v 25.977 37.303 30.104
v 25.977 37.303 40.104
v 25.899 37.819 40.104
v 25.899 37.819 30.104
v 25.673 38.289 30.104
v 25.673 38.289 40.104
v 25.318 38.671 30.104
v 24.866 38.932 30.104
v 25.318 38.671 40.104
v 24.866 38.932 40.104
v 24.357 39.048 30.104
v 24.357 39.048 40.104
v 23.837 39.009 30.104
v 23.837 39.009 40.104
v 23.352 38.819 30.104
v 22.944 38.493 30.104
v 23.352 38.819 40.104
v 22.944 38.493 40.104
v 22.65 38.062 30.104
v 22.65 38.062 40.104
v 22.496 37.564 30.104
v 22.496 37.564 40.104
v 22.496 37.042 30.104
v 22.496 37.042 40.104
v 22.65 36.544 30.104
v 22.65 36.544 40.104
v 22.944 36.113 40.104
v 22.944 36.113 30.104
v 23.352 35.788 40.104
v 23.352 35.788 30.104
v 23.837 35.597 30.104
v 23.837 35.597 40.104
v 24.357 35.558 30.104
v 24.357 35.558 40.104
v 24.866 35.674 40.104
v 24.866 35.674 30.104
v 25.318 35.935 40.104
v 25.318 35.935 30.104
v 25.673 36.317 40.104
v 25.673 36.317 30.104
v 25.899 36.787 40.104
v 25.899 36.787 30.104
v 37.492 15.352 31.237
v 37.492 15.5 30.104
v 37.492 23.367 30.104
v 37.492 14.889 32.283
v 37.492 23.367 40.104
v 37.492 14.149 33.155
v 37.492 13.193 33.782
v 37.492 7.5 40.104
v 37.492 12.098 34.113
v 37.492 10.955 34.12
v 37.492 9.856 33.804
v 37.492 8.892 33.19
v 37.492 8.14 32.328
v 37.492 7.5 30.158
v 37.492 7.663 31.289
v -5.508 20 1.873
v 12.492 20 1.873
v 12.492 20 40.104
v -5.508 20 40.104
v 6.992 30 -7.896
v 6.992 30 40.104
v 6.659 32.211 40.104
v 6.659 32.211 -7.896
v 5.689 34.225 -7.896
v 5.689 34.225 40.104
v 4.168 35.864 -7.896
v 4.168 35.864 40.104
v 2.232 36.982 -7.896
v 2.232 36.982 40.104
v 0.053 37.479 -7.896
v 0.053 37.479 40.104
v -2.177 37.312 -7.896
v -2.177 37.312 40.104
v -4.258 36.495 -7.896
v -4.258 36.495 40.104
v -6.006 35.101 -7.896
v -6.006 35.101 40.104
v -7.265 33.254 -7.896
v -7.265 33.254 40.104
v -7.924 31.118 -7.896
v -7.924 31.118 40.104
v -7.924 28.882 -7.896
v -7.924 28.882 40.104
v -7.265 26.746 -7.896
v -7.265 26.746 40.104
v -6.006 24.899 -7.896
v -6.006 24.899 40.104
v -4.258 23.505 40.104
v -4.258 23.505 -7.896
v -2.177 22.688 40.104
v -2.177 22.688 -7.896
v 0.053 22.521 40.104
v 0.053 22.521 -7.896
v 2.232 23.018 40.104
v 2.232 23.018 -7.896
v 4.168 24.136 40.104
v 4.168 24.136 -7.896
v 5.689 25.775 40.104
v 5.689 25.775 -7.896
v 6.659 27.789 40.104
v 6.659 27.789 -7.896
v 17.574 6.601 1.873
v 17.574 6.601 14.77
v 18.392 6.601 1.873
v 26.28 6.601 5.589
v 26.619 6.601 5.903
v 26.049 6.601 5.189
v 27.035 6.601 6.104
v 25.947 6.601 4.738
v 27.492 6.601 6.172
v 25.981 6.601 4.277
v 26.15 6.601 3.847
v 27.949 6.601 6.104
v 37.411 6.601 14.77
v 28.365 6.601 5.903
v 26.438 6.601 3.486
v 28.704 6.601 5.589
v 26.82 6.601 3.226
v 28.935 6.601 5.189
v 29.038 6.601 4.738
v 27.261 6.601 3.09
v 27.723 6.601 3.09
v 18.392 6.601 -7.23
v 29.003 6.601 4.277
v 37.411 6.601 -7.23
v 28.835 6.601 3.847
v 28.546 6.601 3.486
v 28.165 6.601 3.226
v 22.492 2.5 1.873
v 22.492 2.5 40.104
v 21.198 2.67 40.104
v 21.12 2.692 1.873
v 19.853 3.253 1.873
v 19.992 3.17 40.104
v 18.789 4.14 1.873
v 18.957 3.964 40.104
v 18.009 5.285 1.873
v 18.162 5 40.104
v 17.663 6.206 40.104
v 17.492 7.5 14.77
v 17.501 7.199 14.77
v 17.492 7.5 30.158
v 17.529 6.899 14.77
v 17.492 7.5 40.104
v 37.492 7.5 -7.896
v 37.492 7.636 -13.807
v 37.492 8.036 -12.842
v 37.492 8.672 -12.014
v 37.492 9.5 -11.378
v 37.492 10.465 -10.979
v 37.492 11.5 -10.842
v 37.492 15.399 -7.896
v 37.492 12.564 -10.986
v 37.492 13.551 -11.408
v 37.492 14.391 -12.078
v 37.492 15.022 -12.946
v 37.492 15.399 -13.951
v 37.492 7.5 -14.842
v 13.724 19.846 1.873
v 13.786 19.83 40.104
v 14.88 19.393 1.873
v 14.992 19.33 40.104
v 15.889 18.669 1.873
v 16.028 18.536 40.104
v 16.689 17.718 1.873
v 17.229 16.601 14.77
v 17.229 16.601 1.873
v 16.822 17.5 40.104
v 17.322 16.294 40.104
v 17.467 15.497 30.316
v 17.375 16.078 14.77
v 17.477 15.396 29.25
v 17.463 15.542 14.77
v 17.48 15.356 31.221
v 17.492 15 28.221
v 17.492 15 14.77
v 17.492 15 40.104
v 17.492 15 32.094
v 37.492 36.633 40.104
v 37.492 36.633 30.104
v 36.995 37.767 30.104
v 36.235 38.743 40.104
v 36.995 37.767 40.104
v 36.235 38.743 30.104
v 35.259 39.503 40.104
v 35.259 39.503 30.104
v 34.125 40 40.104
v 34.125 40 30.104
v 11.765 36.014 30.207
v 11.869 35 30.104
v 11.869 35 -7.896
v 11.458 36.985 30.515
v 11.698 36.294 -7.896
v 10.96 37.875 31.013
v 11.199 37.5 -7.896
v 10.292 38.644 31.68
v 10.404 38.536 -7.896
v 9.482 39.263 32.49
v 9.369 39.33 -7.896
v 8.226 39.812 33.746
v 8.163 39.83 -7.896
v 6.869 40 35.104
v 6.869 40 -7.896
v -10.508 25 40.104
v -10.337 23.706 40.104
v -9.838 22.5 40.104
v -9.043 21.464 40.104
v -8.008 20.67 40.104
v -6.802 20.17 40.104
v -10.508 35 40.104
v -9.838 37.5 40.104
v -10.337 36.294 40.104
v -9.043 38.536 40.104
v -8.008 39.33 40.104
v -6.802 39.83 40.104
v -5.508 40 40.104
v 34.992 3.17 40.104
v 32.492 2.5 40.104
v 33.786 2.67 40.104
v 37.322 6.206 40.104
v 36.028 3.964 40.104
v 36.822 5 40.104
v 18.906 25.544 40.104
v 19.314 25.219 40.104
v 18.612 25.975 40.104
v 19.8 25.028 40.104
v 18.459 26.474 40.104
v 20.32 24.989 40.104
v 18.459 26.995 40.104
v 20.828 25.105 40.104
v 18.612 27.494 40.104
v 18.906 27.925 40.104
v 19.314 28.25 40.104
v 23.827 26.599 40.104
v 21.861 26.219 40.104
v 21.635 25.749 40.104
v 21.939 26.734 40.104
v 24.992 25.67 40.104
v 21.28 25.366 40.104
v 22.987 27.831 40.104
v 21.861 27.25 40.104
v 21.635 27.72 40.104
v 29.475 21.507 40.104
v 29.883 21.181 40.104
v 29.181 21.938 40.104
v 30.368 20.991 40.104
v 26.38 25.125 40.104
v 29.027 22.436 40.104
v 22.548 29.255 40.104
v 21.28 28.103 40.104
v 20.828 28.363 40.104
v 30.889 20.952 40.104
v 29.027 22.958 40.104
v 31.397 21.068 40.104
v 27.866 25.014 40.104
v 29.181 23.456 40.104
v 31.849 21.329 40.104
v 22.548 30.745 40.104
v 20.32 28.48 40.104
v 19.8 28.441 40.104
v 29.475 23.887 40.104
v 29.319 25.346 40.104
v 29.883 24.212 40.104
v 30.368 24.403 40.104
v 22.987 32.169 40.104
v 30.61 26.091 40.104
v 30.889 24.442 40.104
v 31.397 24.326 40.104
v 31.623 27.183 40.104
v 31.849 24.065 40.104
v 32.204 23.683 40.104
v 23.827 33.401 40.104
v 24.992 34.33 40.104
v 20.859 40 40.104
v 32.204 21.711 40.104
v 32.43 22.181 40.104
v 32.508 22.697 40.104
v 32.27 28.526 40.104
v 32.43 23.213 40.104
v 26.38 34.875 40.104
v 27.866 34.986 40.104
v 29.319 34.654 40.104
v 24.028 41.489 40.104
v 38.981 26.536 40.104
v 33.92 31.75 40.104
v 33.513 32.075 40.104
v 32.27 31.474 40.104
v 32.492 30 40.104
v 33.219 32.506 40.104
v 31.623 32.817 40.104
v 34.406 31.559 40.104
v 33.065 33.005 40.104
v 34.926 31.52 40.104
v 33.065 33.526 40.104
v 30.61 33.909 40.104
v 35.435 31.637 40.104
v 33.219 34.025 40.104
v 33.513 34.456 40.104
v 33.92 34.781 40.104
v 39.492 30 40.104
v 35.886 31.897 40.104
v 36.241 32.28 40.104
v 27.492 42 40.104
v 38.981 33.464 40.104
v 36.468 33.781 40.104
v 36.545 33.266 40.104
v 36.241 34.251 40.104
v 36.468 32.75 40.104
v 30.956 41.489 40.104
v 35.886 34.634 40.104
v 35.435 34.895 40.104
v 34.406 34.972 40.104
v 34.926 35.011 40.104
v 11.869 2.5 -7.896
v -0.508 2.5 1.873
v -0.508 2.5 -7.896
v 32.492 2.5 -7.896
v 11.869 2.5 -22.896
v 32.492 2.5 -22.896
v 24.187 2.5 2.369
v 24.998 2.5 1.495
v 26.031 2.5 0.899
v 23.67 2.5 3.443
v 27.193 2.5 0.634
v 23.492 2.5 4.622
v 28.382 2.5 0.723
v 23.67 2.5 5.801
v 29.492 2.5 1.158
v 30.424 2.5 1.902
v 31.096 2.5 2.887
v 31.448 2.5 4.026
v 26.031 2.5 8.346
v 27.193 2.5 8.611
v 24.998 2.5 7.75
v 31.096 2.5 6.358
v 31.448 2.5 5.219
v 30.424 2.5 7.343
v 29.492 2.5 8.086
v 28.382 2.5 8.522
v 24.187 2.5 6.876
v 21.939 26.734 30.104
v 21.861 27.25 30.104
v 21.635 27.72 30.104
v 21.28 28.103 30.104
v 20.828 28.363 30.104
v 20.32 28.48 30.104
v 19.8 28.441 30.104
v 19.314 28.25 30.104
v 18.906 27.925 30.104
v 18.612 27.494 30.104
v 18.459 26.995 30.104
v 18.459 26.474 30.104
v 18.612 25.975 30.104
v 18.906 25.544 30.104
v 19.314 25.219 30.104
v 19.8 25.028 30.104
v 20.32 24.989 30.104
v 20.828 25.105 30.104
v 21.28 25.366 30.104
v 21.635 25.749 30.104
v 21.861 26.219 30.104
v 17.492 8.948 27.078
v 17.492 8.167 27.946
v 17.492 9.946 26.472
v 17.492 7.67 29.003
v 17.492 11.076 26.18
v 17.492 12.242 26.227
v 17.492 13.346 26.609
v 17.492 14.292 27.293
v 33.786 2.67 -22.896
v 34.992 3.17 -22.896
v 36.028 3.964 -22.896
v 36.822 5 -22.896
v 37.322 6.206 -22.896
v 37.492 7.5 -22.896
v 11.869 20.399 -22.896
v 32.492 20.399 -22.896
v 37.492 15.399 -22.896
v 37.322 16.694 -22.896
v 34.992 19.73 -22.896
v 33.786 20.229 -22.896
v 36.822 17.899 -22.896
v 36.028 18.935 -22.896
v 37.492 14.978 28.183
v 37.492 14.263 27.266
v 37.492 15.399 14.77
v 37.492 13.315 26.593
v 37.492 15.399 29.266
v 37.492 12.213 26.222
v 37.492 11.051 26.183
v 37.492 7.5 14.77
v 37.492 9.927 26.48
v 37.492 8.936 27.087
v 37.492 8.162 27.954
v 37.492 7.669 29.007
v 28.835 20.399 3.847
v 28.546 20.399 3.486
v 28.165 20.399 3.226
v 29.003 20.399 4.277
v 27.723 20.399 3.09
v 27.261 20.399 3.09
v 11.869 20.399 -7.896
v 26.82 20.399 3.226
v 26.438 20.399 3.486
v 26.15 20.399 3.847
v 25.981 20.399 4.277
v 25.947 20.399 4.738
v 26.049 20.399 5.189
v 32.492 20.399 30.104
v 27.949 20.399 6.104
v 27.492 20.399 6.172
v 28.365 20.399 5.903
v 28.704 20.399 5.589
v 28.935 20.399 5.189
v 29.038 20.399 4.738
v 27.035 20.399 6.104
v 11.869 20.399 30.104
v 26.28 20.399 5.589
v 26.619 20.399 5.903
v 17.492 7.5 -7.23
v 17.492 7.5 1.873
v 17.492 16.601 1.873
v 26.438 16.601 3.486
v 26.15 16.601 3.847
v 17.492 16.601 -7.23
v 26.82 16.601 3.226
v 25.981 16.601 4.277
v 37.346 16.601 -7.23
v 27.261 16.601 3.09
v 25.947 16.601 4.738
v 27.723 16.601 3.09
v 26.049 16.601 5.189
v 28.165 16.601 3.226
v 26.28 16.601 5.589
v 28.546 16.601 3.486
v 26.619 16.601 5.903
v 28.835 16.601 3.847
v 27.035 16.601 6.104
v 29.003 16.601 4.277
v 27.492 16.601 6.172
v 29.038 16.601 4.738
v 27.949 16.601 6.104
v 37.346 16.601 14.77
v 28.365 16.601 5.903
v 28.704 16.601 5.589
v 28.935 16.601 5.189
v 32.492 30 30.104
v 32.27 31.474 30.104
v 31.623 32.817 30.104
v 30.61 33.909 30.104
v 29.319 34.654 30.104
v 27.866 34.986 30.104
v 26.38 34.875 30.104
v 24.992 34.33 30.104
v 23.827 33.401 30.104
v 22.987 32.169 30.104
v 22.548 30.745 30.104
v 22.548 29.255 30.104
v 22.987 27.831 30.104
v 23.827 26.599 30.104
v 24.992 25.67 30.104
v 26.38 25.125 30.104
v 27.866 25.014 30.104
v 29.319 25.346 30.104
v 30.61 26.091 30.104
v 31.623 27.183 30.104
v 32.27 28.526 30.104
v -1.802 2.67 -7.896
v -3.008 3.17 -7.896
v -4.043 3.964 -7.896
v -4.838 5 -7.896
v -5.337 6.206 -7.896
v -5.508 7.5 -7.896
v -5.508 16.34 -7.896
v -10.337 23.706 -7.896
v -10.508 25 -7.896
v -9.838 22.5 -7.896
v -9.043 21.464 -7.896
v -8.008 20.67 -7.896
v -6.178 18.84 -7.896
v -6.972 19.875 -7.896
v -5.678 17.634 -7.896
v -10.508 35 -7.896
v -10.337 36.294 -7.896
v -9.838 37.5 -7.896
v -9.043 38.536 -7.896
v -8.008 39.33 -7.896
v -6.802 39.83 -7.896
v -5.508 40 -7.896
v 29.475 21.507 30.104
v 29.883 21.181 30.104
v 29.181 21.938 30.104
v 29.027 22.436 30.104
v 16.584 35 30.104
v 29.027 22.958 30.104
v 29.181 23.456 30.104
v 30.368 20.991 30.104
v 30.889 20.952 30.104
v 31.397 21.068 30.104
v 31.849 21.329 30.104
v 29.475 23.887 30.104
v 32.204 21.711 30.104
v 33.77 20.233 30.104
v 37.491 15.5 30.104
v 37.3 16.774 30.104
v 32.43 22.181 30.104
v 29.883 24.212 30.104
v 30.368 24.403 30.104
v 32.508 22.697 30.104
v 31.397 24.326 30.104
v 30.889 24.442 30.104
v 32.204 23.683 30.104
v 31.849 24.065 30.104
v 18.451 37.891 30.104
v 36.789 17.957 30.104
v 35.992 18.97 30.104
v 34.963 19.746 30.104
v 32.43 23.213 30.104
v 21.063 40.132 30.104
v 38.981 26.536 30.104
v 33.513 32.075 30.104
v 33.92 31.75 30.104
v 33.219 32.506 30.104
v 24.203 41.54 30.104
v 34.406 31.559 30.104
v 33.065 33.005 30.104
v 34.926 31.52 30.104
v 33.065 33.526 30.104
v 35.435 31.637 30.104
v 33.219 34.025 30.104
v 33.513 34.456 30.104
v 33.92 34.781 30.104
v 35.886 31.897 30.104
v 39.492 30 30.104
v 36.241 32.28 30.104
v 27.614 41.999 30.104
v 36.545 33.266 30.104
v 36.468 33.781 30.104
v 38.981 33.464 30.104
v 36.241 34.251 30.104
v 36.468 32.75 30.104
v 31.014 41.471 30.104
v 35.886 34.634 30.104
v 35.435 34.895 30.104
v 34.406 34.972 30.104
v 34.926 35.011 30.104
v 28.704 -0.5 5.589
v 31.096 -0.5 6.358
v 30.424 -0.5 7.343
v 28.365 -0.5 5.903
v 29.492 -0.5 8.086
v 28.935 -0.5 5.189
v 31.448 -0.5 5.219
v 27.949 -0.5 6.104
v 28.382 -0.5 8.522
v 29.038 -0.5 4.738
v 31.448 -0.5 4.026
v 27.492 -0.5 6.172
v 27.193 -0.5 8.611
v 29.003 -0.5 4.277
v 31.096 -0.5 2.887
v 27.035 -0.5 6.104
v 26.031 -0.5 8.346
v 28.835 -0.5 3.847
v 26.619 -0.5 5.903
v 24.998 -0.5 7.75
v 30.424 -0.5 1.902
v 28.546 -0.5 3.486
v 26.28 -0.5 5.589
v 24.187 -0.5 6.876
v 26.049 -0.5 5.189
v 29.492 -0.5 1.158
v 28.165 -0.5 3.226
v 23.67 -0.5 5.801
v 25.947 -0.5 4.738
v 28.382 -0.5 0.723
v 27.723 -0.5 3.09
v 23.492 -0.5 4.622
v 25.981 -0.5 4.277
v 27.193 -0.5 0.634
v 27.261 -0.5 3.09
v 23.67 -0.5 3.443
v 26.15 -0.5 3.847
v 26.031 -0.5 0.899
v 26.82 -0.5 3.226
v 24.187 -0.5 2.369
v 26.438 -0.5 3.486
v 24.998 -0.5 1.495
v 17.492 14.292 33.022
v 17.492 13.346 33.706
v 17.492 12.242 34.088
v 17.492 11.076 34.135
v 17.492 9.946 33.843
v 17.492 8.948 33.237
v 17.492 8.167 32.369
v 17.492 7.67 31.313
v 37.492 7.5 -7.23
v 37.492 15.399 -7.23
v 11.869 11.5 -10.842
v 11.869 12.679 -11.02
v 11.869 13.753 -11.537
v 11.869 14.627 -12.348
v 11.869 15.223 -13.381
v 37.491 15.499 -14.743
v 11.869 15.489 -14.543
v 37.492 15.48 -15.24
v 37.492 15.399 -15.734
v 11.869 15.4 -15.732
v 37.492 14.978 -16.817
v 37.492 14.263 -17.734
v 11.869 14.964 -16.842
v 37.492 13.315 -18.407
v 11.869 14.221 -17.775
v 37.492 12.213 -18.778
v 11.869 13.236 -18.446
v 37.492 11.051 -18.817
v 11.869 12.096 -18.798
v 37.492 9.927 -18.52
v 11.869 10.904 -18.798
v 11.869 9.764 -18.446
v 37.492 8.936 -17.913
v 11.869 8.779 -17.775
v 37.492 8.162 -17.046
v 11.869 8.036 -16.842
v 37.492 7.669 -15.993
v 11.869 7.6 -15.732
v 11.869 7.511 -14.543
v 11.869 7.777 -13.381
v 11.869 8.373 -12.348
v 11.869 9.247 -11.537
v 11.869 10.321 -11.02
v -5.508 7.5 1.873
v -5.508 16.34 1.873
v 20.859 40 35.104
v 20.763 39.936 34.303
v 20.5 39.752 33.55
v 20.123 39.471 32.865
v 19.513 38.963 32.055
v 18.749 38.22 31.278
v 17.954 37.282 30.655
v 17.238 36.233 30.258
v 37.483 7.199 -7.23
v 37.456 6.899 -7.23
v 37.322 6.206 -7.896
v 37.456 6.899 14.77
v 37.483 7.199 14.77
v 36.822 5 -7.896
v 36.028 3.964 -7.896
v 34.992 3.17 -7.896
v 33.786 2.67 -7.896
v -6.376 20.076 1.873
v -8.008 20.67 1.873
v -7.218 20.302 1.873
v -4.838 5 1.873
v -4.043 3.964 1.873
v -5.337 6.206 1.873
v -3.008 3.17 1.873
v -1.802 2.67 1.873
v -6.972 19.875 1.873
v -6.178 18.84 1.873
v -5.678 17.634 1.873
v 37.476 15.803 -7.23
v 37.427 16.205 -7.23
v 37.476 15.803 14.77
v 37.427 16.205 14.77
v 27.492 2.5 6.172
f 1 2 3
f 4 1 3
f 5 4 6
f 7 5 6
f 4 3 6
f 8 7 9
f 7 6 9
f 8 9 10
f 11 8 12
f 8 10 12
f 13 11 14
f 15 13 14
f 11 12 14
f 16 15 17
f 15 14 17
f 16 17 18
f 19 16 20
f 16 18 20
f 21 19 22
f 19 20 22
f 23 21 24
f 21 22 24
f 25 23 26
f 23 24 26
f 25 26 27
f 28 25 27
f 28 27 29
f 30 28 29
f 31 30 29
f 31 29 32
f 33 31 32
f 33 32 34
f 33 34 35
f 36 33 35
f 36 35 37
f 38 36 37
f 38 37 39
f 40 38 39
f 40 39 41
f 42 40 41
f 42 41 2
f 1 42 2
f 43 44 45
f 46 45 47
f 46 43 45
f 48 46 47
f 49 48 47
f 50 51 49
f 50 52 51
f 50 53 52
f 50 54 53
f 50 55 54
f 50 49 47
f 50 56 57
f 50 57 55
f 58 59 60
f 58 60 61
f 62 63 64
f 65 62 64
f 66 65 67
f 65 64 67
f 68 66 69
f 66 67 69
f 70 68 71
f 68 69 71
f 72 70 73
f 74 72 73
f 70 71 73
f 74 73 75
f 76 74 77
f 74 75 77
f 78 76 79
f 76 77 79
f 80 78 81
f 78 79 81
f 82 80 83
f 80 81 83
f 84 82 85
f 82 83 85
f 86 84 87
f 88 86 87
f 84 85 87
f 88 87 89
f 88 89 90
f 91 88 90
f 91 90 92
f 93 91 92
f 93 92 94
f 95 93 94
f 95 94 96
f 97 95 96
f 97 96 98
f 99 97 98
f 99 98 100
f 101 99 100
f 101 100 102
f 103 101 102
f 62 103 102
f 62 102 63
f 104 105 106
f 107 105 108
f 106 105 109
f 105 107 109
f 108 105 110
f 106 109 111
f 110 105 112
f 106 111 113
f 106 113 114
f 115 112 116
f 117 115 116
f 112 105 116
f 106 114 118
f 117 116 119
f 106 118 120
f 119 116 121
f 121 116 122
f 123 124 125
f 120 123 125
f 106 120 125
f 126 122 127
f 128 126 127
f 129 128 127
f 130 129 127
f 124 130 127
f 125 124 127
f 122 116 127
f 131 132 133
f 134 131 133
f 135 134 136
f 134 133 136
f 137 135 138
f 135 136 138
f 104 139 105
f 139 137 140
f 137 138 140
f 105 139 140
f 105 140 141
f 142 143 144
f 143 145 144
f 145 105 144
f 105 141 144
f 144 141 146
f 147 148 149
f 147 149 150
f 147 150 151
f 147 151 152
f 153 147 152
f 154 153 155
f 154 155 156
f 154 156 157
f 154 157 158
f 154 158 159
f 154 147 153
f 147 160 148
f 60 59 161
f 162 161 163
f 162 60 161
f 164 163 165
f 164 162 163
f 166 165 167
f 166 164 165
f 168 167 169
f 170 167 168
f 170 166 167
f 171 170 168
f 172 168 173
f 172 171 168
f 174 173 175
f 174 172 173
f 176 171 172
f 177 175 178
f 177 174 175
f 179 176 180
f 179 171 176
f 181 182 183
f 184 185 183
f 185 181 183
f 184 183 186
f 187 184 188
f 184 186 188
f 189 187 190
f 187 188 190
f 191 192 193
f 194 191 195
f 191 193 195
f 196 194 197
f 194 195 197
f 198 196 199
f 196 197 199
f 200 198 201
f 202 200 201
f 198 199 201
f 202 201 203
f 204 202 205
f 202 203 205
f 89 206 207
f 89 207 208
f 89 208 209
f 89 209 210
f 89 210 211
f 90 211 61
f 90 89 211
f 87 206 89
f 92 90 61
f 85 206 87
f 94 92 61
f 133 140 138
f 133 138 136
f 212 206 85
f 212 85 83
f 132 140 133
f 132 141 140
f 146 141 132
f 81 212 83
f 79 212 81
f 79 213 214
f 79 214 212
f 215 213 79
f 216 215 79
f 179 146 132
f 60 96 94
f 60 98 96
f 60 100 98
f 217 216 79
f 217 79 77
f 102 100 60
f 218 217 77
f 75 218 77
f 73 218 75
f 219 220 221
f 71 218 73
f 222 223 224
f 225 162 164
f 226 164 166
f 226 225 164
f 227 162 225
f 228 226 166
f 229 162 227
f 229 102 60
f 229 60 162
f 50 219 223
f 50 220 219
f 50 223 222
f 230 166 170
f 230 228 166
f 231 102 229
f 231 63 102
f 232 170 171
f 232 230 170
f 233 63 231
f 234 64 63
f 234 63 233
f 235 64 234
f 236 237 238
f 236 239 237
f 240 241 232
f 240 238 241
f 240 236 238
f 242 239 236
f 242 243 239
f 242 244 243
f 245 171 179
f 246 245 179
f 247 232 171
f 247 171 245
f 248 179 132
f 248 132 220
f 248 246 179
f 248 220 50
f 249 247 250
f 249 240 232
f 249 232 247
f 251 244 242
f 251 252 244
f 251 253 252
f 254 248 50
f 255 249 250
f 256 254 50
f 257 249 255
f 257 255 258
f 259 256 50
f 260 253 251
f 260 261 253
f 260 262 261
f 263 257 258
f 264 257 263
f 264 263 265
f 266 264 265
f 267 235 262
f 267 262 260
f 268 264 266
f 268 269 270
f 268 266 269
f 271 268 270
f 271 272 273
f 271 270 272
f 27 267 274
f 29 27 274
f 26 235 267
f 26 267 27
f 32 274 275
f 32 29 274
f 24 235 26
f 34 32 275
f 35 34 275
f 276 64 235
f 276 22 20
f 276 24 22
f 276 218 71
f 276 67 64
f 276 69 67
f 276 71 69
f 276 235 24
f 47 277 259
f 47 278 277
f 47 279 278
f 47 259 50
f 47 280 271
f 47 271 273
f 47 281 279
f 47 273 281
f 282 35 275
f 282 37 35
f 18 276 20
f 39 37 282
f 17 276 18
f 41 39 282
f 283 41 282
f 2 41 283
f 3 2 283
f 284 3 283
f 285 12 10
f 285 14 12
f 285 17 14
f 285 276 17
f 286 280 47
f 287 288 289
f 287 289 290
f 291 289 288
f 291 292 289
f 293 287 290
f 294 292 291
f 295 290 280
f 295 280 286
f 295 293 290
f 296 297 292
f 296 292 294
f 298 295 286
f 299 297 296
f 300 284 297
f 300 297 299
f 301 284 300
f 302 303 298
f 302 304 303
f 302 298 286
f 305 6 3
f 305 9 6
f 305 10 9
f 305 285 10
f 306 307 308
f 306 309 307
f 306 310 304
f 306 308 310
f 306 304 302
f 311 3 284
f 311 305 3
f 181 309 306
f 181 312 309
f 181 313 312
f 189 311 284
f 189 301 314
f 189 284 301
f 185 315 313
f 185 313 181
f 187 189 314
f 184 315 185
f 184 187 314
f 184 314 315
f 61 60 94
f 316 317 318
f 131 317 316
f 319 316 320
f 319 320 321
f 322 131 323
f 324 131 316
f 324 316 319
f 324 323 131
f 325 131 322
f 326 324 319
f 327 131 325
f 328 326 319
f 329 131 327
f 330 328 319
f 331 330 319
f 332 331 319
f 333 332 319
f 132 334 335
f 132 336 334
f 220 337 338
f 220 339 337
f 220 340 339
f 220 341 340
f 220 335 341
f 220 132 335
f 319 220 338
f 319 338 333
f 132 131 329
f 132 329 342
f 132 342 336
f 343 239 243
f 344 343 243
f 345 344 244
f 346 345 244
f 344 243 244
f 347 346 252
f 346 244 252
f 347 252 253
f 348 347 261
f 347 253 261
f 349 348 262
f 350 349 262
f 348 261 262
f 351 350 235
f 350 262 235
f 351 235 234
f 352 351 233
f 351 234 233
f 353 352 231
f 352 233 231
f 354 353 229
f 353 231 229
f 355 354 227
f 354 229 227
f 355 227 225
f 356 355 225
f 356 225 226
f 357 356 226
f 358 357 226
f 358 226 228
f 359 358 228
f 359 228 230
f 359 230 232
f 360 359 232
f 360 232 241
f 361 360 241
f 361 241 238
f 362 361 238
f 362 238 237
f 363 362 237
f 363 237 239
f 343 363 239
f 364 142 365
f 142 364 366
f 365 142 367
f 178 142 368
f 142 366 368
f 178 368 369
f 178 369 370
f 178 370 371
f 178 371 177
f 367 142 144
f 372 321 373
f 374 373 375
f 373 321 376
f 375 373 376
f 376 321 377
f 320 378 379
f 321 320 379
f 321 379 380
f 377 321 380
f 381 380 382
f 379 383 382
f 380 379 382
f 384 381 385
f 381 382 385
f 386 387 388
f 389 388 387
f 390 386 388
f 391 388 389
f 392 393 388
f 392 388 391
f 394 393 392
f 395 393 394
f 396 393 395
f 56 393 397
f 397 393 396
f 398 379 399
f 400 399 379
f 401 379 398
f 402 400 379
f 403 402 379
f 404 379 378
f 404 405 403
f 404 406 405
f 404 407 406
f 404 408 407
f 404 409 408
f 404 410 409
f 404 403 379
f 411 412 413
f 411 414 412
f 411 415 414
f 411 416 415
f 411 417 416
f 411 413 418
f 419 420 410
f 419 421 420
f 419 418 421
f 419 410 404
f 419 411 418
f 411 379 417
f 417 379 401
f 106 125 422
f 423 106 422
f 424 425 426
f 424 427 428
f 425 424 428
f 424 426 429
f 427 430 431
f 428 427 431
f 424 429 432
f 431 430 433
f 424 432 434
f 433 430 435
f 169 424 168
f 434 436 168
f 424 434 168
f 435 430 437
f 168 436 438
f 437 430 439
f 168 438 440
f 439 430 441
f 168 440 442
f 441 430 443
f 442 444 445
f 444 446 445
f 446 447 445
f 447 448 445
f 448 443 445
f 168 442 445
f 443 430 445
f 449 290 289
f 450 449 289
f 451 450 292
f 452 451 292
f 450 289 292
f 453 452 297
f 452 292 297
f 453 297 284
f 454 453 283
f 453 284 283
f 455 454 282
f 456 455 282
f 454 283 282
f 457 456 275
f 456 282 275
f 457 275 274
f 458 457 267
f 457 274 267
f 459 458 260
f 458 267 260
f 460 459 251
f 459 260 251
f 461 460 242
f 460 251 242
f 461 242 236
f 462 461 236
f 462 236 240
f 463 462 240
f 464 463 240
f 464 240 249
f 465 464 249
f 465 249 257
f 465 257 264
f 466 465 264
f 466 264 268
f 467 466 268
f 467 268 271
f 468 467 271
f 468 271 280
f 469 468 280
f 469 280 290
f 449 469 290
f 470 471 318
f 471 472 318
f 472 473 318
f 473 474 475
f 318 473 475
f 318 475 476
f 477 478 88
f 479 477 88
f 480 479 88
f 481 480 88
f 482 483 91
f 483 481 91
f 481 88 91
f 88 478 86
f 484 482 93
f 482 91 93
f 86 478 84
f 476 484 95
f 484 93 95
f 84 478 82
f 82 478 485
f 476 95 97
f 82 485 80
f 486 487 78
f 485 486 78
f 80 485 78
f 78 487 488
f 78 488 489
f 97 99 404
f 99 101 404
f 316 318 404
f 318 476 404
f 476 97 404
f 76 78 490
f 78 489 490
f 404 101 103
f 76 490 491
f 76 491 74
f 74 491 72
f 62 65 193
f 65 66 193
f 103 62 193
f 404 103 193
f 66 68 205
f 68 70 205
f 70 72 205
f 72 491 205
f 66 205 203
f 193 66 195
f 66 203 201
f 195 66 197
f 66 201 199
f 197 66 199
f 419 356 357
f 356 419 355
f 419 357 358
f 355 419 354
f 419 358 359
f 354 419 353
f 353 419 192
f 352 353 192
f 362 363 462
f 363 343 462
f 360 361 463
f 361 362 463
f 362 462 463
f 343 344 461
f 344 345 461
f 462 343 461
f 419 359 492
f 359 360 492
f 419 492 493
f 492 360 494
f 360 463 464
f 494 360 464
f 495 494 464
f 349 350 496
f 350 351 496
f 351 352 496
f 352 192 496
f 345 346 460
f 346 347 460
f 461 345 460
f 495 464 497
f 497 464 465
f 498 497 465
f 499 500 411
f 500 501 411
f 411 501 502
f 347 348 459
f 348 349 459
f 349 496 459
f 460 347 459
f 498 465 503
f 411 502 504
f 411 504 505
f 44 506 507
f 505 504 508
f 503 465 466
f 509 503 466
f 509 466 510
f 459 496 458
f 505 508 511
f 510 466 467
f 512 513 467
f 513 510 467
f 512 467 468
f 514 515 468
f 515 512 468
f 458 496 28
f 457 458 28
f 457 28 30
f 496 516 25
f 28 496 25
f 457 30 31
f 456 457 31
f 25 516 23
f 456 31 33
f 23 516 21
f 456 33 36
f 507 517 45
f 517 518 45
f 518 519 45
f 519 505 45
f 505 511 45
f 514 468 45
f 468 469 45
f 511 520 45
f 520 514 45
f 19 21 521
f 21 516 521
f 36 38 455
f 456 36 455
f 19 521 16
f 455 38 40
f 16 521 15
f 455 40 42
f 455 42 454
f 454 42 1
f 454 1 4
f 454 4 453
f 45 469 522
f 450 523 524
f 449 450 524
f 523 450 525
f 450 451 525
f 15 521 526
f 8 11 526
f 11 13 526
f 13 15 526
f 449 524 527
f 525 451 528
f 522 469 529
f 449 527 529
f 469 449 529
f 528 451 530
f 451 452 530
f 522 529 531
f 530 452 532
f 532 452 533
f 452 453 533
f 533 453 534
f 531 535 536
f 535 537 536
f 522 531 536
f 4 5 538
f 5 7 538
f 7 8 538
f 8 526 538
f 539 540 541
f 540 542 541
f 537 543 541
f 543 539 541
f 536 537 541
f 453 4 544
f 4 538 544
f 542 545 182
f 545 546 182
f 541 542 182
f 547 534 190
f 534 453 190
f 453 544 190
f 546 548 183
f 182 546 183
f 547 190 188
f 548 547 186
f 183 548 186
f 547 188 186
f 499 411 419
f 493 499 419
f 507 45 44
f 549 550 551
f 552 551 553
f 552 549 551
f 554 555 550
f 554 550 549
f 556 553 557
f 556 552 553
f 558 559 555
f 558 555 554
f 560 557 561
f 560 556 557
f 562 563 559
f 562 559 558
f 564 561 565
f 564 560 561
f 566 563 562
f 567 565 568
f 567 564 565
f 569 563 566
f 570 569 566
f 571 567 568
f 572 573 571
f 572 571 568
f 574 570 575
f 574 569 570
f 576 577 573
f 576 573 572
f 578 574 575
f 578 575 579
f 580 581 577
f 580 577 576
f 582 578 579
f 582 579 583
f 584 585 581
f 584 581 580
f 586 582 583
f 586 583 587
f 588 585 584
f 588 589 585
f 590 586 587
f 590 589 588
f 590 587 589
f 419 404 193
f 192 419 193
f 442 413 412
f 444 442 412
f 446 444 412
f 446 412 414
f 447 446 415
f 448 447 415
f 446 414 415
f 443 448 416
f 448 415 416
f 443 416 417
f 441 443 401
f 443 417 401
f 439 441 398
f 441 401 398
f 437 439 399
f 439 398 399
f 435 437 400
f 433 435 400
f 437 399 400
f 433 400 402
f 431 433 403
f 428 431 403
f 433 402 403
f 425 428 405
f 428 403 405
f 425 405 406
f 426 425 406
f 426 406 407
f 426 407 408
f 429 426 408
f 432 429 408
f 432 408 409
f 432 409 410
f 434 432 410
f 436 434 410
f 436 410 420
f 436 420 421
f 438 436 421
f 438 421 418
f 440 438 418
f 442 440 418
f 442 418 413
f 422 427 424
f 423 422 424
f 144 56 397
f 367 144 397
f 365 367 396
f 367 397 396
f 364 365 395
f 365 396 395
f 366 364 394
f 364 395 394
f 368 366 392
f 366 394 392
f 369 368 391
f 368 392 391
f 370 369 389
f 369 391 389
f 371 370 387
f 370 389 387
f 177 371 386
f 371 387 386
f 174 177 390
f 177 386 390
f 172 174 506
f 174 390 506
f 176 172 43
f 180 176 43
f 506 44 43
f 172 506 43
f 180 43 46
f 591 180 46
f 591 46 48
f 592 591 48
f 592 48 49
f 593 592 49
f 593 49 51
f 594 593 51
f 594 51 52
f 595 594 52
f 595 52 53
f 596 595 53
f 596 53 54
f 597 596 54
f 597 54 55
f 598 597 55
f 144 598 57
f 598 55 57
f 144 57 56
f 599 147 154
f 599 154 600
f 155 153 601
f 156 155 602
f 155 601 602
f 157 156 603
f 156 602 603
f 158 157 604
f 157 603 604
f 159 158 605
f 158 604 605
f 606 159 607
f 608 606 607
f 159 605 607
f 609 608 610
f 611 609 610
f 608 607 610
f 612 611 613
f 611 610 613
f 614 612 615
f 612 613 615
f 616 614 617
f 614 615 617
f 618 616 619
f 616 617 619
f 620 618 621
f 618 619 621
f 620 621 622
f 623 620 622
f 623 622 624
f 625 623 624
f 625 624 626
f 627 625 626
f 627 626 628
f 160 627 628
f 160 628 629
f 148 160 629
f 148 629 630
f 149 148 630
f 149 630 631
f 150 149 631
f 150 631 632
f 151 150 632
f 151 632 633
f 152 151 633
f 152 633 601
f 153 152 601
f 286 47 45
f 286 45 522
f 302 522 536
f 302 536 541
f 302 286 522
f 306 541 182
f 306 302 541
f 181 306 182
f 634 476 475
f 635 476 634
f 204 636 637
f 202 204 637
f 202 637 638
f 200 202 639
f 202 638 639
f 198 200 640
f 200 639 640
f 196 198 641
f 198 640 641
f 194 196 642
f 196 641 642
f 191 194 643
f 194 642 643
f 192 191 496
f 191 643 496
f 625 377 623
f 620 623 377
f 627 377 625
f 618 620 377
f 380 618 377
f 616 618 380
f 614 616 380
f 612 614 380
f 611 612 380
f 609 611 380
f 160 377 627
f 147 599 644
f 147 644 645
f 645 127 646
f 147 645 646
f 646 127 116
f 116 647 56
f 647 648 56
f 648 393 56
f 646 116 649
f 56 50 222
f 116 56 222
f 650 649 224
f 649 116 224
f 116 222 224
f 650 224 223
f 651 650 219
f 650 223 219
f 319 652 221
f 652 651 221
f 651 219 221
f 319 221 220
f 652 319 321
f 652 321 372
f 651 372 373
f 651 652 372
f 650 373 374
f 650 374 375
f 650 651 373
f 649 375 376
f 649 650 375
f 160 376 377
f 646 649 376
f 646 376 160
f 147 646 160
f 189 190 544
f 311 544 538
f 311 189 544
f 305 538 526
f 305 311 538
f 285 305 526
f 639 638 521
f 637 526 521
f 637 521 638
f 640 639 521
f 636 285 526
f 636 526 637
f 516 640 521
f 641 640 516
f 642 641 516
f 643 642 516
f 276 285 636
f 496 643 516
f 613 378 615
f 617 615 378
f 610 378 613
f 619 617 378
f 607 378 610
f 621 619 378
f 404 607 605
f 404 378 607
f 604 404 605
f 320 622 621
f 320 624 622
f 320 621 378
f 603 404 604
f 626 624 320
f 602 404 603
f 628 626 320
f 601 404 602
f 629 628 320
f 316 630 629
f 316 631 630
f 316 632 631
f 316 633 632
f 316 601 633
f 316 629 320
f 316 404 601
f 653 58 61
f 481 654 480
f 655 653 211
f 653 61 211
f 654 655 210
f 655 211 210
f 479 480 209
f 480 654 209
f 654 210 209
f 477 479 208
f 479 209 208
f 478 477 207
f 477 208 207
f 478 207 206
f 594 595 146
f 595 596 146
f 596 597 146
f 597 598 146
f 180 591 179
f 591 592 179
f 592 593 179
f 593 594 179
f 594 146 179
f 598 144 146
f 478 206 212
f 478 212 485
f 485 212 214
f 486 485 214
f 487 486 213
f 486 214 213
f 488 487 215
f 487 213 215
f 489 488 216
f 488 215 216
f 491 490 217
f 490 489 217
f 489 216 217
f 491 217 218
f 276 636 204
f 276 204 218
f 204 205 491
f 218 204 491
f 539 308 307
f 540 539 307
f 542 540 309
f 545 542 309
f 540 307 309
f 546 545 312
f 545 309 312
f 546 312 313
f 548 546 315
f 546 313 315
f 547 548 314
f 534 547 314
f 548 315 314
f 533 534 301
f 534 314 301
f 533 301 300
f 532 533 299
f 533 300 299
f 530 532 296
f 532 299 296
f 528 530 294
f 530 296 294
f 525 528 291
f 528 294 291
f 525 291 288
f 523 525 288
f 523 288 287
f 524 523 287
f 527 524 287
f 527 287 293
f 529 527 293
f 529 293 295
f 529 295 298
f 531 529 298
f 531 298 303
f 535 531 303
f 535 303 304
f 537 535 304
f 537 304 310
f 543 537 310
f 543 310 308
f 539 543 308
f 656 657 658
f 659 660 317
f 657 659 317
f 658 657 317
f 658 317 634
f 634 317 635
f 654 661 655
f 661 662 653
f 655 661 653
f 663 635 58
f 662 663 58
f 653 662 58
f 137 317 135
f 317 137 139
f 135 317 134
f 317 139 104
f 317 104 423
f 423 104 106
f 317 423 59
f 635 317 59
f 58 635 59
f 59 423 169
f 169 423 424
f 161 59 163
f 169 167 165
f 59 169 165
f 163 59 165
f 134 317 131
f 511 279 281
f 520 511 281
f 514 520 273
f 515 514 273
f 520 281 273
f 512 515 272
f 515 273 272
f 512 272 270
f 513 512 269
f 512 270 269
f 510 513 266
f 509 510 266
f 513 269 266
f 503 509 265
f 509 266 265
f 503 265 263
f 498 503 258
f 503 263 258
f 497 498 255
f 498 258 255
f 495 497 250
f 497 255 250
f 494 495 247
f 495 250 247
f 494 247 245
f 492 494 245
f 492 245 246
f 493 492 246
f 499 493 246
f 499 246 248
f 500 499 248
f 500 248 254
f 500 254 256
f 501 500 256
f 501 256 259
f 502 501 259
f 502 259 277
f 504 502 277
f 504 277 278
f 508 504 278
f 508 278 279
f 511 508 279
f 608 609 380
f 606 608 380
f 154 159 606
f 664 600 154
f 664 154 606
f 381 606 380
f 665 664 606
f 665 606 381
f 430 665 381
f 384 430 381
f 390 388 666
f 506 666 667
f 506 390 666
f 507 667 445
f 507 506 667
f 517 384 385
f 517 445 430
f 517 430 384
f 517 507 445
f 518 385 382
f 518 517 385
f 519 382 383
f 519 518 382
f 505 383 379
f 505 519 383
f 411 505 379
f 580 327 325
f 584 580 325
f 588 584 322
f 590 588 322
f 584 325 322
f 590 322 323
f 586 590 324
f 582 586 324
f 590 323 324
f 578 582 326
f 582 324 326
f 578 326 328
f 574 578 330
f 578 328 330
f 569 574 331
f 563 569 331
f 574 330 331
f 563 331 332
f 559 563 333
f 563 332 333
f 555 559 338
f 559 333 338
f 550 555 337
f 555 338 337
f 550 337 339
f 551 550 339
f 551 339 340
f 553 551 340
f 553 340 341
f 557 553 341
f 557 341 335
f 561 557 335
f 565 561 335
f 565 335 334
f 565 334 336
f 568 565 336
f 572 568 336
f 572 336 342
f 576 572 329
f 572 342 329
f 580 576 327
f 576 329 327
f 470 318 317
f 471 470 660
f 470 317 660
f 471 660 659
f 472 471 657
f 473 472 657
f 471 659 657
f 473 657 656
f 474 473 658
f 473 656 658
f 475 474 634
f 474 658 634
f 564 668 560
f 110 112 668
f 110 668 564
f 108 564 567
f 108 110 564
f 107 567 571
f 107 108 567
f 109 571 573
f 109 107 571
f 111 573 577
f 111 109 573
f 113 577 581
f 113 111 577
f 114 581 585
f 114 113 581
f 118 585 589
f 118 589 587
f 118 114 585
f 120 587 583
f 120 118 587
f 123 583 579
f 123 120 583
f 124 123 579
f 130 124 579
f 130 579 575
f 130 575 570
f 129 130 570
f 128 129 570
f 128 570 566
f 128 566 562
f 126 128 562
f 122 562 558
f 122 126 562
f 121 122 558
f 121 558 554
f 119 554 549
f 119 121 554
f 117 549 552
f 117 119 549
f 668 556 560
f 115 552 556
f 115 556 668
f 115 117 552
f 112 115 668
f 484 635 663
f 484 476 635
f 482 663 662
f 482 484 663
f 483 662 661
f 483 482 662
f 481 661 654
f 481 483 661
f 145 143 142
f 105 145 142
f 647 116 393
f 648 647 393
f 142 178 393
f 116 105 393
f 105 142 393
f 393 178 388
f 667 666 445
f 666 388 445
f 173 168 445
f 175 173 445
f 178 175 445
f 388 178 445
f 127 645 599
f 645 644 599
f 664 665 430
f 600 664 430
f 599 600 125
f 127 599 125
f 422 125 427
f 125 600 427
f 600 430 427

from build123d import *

# Parameters (mm, degrees)
EXTRUDE_1_DEPTH      = 40
SKETCH_2_R           = 7.5
SKETCH_2_R_2         = 4.9999999999999964
SKETCH_2_R_3         = 1.7500000000003626
SKETCH_2_R_4         = 1.7500000000004823
SKETCH_2_R_5         = 1.7500000000000004
SKETCH_2_R_6         = 1.7500000000001783
CUT_EXTRUDE_1_DEPTH  = 73.86746296427441
SKETCH_3_R           = 12.000000000543196
SKETCH_3_R_2         = 5.500000000543195
SKETCH_3_R_3         = 1.750000000000366
SKETCH_3_R_4         = 1.7500000000000004
SKETCH_3_R_5         = 1.7500000000001772
SKETCH_3_R_6         = 1.7500000000004823
EXTRUDE_3_DEPTH      = 10
SKETCH_4_W           = 25.62343390414386
SKETCH_4_H           = 19.600582626289906
CUT_EXTRUDE_2_DEPTH  = 38.00000000000001
FILLET_1_R           = 5
SKETCH_5_W           = 22
SKETCH_5_H           = 10
CUT_EXTRUDE_3_DEPTH  = 76.3412297087783
CUT_EXTRUDE_4_DEPTH  = 76.01757174727166
FILLET_2_R           = 5
EXTRUDE_4_DEPTH      = 23.000000000000007
FILLET_3_R           = 5
FILLET_4_R           = 5
SKETCH_8_R           = 1.5500000000000012
CUT_EXTRUDE_5_DEPTH  = 61.28699815842466
SKETCH_10_R          = 3.9999999999990434
SKETCH_10_R_2        = 1.5500000001559846
EXTRUDE_6_DEPTH      = 3
EXTRUDE_7_DEPTH      = 9.769249944
SKETCH_14_R          = 4.00000000000006
CUT_EXTRUDE_7_DEPTH  = 76.341229817754
EXTRUDE_8_DEPTH      = 15
SKETCH_18_R          = 3.999999999998341
CUT_EXTRUDE_10_DEPTH = 65.30672601787643
SKETCH_16_R          = 3.9999999998192686
CUT_EXTRUDE_8_DEPTH  = 76.341229817754


# Some blends are built 0.0001 mm under size
with BuildPart() as part:
    # 草图1 → 凸台-拉伸1 (new body)
    with BuildSketch(Plane(origin=(0, 0, 0), x_dir=(1, 0, 0), z_dir=(0, 1, 0))):
        Polygon((-10.50777202072539, 7.896373056994778), (37.49222797927462, 7.896373056994778), (37.492227979274624, -40.10362694300522), (-10.507772020725387, -40.10362694300522), align=None)
    extrude(amount=EXTRUDE_1_DEPTH)

    # 草图2 → 切除-拉伸1 (cut, through all)
    with BuildSketch(Plane.XY.offset(40.10362694300522)):
        with Locations((-0.5077720207253867, 30)):
            Circle(SKETCH_2_R)
        with Locations((27.492227979274613, 30)):
            Circle(SKETCH_2_R_2)
        with Locations((24.22666093119229, 37.303154924739225)):
            Circle(SKETCH_2_R_3)
        with Locations((34.79538290399571, 33.26556704810026)):
            Circle(SKETCH_2_R_4)
        with Locations((20.18907305455331, 26.7344329519358)):
            Circle(SKETCH_2_R_5)
        with Locations((30.75779502735674, 22.696845075296828)):
            Circle(SKETCH_2_R_6)
    extrude(amount=-CUT_EXTRUDE_1_DEPTH, mode=Mode.SUBTRACT)

    # 草图3 → 凸台-拉伸3 (add)
    with BuildSketch(Plane.XY.offset(40.10362694300522)):
        with Locations((27.492227979274418, 30.00000000001826)):
            Circle(SKETCH_3_R)
        with Locations((27.492227979274418, 30.00000000001826)):
            Circle(SKETCH_3_R_2, mode=Mode.SUBTRACT)
        with Locations((24.22666093119229, 37.30315492473925)):
            Circle(SKETCH_3_R_3, mode=Mode.SUBTRACT)
        with Locations((20.18907305455331, 26.734432951935826)):
            Circle(SKETCH_3_R_4, mode=Mode.SUBTRACT)
        with Locations((30.75779502735674, 22.696845075296856)):
            Circle(SKETCH_3_R_5, mode=Mode.SUBTRACT)
        with Locations((34.79538290399571, 33.26556704810028)):
            Circle(SKETCH_3_R_6, mode=Mode.SUBTRACT)
    extrude(amount=-EXTRUDE_3_DEPTH)

    # 草图4 → 切除-拉伸2 (cut)
    with BuildSketch(Plane(origin=(0, 0, -7.896373056994778), x_dir=(-1, 0, 0), z_dir=(0, 0, -1))):
        with Locations((-24.680511027202687, 30.199708686855047)):
            Rectangle(SKETCH_4_W, SKETCH_4_H)
    extrude(amount=-CUT_EXTRUDE_2_DEPTH, mode=Mode.SUBTRACT)

    # 圆角1
    # the kernel refuses this fillet: 5 mm, written as the material it takes off along each edge
    with BuildSketch(Plane(origin=(37.492227979274624, 40, 21.686750897283794), x_dir=(0, -1, 0), z_dir=(1.5e-16, 0, 1))) as fillet_1_piece_1:
        with BuildLine():
            CenterArc((4.792434215535032, -4.792434215539004), FILLET_1_R, 106.56702352707134, 56.8659529456977)
            Line((0, -3.366750418279196), (0, 0))
            Line((0, 0), (3.366750418288575, 0))
        make_face()
    extrude(amount=26.833752091442854, mode=Mode.SUBTRACT)

    # 草图5 → 切除-拉伸3 (cut, through all)
    with BuildSketch(Plane(origin=(37.49222797927462, 0, -5.42e-15), x_dir=(-1.4e-16, 0, -1), z_dir=(1, 0, -1.4e-16))):
        with Locations((-3.7696196746029966, 11.600566044145527)):
            Rectangle(SKETCH_5_W, SKETCH_5_H)
    extrude(amount=-CUT_EXTRUDE_3_DEPTH, mode=Mode.SUBTRACT)

    # 草图6 → 切除-拉伸4 (cut, through all)
    with BuildSketch(Plane.XY.offset(40.10362694300522)):
        Polygon((37.492227979274624, 0), (37.492227979274624, 2.5000000000259677), (17.492227979274624, 2.5000000000259655), (17.492227979274624, 20.000000000000004), (-10.507772020725385, 20), (-10.507772020725387, 0), align=None)
    extrude(amount=-CUT_EXTRUDE_4_DEPTH, mode=Mode.SUBTRACT)

    # 圆角2
    # the kernel refuses this fillet: 5 mm, written as the material it adds along each edge
    with BuildSketch(Plane(origin=(17.492227979274624, 20.000000000000004, 40.10362694300522), x_dir=(-1, 0, 0), z_dir=(0, 0, -1))) as fillet_2_piece_1_section:
        with BuildLine():
            CenterArc((FILLET_2_R, -FILLET_2_R), FILLET_2_R, 90, 90)
            Line((0, -FILLET_2_R), (0, 0))
            Line((0, 0), (FILLET_2_R, 0))
        make_face()
    fillet_2_piece_1 = extrude(amount=47.99999999999999, mode=Mode.PRIVATE)
    fillet_2_piece_1 = split(fillet_2_piece_1, bisect_by=Plane(origin=(17.49222797927462, 20.000000000000004, 14.769619674602993), z_dir=(1.4e-16, 0, 1)), keep=Keep.TOP, mode=Mode.PRIVATE)
    fillet_2_piece_1 = split(fillet_2_piece_1, bisect_by=Plane(origin=(17.492227979274624, 16.600566044145527, 40.10362694300522), z_dir=(0, 1, 0)), keep=Keep.TOP, mode=Mode.PRIVATE)
    add(fillet_2_piece_1)
    with BuildSketch(Plane(origin=(17.492227979274624, 20.000000000000004, 40.10362694300522), x_dir=(-1, 0, 0), z_dir=(0, 0, -1))) as fillet_2_piece_2_section:
        with BuildLine():
            CenterArc((FILLET_2_R, -FILLET_2_R), FILLET_2_R, 90, 90)
            Line((0, -FILLET_2_R), (0, 0))
            Line((0, 0), (FILLET_2_R, 0))
        make_face()
    fillet_2_piece_2 = extrude(amount=47.99999999999999, mode=Mode.PRIVATE)
    fillet_2_piece_2 = split(fillet_2_piece_2, bisect_by=Plane(origin=(17.49222797927462, 20.000000000000004, 14.769619674602993), z_dir=(1.4e-16, 0, 1)), keep=Keep.TOP, mode=Mode.PRIVATE)
    fillet_2_piece_2 = split(fillet_2_piece_2, bisect_by=Plane(origin=(17.492227979274624, 16.600566044145527, 40.10362694300522), z_dir=(0, -1, 0)), keep=Keep.TOP, mode=Mode.PRIVATE)
    add(fillet_2_piece_2)
    with BuildSketch(Plane(origin=(17.492227979274624, 20.000000000000004, 40.10362694300522), x_dir=(-1, 0, 0), z_dir=(0, 0, -1))) as fillet_2_piece_3_section:
        with BuildLine():
            CenterArc((FILLET_2_R, -FILLET_2_R), FILLET_2_R, 90, 90)
            Line((0, -FILLET_2_R), (0, 0))
            Line((0, 0), (FILLET_2_R, 0))
        make_face()
    fillet_2_piece_3 = extrude(amount=47.99999999999999, mode=Mode.PRIVATE)
    fillet_2_piece_3 = split(fillet_2_piece_3, bisect_by=Plane(origin=(17.49222797927462, 20.000000000000004, 14.769619674602993), z_dir=(-1.4e-16, 0, -1)), keep=Keep.TOP, mode=Mode.PRIVATE)
    fillet_2_piece_3 = split(fillet_2_piece_3, bisect_by=Plane(origin=(17.492227979274617, 20.000000000000004, -7.230380325397007), z_dir=(1.4e-16, 0, 1)), keep=Keep.TOP, mode=Mode.PRIVATE)
    fillet_2_piece_3 = split(fillet_2_piece_3, bisect_by=Plane(origin=(17.492227979274624, 16.600566044145527, 40.10362694300522), z_dir=(0, 1, 0)), keep=Keep.TOP, mode=Mode.PRIVATE)
    add(fillet_2_piece_3)
    with BuildSketch(Plane(origin=(17.492227979274624, 20.000000000000004, 40.10362694300522), x_dir=(-1, 0, 0), z_dir=(0, 0, -1))) as fillet_2_piece_4_section:
        with BuildLine():
            CenterArc((FILLET_2_R, -FILLET_2_R), FILLET_2_R, 90, 90)
            Line((0, -FILLET_2_R), (0, 0))
            Line((0, 0), (FILLET_2_R, 0))
        make_face()
    fillet_2_piece_4 = extrude(amount=47.99999999999999, mode=Mode.PRIVATE)
    fillet_2_piece_4 = split(fillet_2_piece_4, bisect_by=Plane(origin=(17.492227979274617, 20.000000000000004, -7.230380325397007), z_dir=(-1.4e-16, 0, -1)), keep=Keep.TOP, mode=Mode.PRIVATE)
    fillet_2_piece_4 = split(fillet_2_piece_4, bisect_by=Plane(origin=(17.492227979274624, 16.600566044145527, 40.10362694300522), z_dir=(0, 1, 0)), keep=Keep.TOP, mode=Mode.PRIVATE)
    add(fillet_2_piece_4)
    with BuildSketch(Plane(origin=(17.492227979274624, 20.000000000000004, 40.10362694300522), x_dir=(-1, 0, 0), z_dir=(0, 0, -1))) as fillet_2_piece_5_section:
        with BuildLine():
            CenterArc((FILLET_2_R, -FILLET_2_R), FILLET_2_R, 90, 90)
            Line((0, -FILLET_2_R), (0, 0))
            Line((0, 0), (FILLET_2_R, 0))
        make_face()
    fillet_2_piece_5 = extrude(amount=47.99999999999999, mode=Mode.PRIVATE)
    fillet_2_piece_5 = split(fillet_2_piece_5, bisect_by=Plane(origin=(17.492227979274617, 20.000000000000004, -7.230380325397007), z_dir=(-1.4e-16, 0, -1)), keep=Keep.TOP, mode=Mode.PRIVATE)
    fillet_2_piece_5 = split(fillet_2_piece_5, bisect_by=Plane(origin=(17.492227979274624, 16.600566044145527, 40.10362694300522), z_dir=(0, -1, 0)), keep=Keep.TOP, mode=Mode.PRIVATE)
    add(fillet_2_piece_5)
    # the kernel refuses this fillet: 5 mm, written as the material it takes off along each edge
    with BuildSketch(Plane(origin=(33.358978397553415, 40, 30.103626943005228), x_dir=(0, -1, -7.1e-16), z_dir=(-1, 0, 0))) as fillet_2_2_piece_1_section:
        with BuildLine():
            CenterArc((FILLET_2_R, FILLET_2_R), FILLET_2_R, 180.00000000000003, 90)
            Line((-3.55e-15, FILLET_2_R), (0, 0))
            Line((0, 0), (FILLET_2_R, 0))
        make_face()
    fillet_2_2_piece_1 = extrude(amount=21.49018432242266, mode=Mode.PRIVATE)
    fillet_2_2_piece_1 = fillet_2_2_piece_1 - Plane(origin=(27.492227979274418, 30.00000000001826, 30.103626943005228), x_dir=(1, 0, 0), z_dir=(0, 0, 1)) * Cylinder(12.000000000543196, 63, mode=Mode.PRIVATE)
    add(fillet_2_2_piece_1, mode=Mode.SUBTRACT)
    with BuildSketch(Plane(origin=(11.868794075130754, 40, -20.396373056994783), x_dir=(0, -1, 0), z_dir=(0, 0, 1))) as fillet_2_2_piece_2:
        with BuildLine():
            CenterArc((FILLET_2_R, -FILLET_2_R), FILLET_2_R, 90, 90)
            Line((0, -FILLET_2_R), (0, 0))
            Line((0, 0), (FILLET_2_R, 0))
        make_face()
    extrude(amount=50.500000000000014, mode=Mode.SUBTRACT)
    with BuildSketch(Plane(origin=(37.492227979274624, 2.5000000000259677, 52.603626943005224), x_dir=(-1, -1.8e-16, 0), z_dir=(0, 0, -1))) as fillet_2_2_piece_3:
        with BuildLine():
            CenterArc((FILLET_2_R, FILLET_2_R), FILLET_2_R, 180, 90)
            Line((-8.9e-16, FILLET_2_R), (0, 0))
            Line((0, 0), (FILLET_2_R, 0))
        make_face()
    extrude(amount=73, mode=Mode.SUBTRACT)
    with BuildSketch(Plane(origin=(-10.507772020725385, 40, 52.603626943005224), x_dir=(1, 0, -7e-17), z_dir=(-7e-17, 0, -1))) as fillet_2_2_piece_4:
        with BuildLine():
            CenterArc((FILLET_2_R, FILLET_2_R), FILLET_2_R, 180, 90)
            Line((-1.78e-15, FILLET_2_R), (0, 0))
            Line((0, 0), (FILLET_2_R, 0))
        make_face()
    extrude(amount=73, mode=Mode.SUBTRACT)
    with BuildSketch(Plane(origin=(-10.507772020725385, 20, 52.603626943005224), x_dir=(-7.1e-16, 1, 0), z_dir=(0, 0, -1))) as fillet_2_2_piece_5:
        with BuildLine():
            CenterArc((FILLET_2_R, FILLET_2_R), FILLET_2_R, 179.99999999999997, 90.00000000000006)
            Line((-3.55e-15, FILLET_2_R), (0, 0))
            Line((0, 0), (FILLET_2_R, 0))
        make_face()
    extrude(amount=73, mode=Mode.SUBTRACT)
    with BuildSketch(Plane(origin=(17.492227979274624, 2.5000000000259655, 52.603626943005224), x_dir=(0, 1, 0), z_dir=(0, 0, -1))) as fillet_2_2_piece_6:
        with BuildLine():
            CenterArc((FILLET_2_R, FILLET_2_R), FILLET_2_R, 180, 90)
            Line((1.33e-15, FILLET_2_R), (0, 0))
            Line((0, 0), (FILLET_2_R, 0))
        make_face()
    extrude(amount=73, mode=Mode.SUBTRACT)
    with BuildSketch(Plane(origin=(33.358978397553415, 40, 30.103626943005228), x_dir=(0, -1, -7.1e-16), z_dir=(-1, 0, 0))) as fillet_2_2_piece_7a_section:
        with BuildLine():
            CenterArc((FILLET_2_R, FILLET_2_R), FILLET_2_R, 180.00000000000003, 90)
            Line((-3.55e-15, FILLET_2_R), (0, 0))
            Line((0, 0), (FILLET_2_R, 0))
        make_face()
    fillet_2_2_piece_7a = extrude(amount=33.990184322422664, mode=Mode.PRIVATE)
    fillet_2_2_piece_7a = split(fillet_2_2_piece_7a, bisect_by=Plane(origin=(11.868794075130754, 40, 30.103626943005228), z_dir=(-1, 0, 0)), keep=Keep.TOP, mode=Mode.PRIVATE)
    with BuildSketch(Plane(origin=(11.868794075130754, 40, -20.396373056994783), x_dir=(0, -1, 0), z_dir=(0, 0, 1))) as fillet_2_2_piece_7b_section:
        with BuildLine():
            CenterArc((FILLET_2_R, -FILLET_2_R), FILLET_2_R, 90, 90)
            Line((0, -FILLET_2_R), (0, 0))
            Line((0, 0), (FILLET_2_R, 0))
        make_face()
    fillet_2_2_piece_7b = extrude(amount=63.000000000000014, mode=Mode.PRIVATE)
    fillet_2_2_piece_7b = split(fillet_2_2_piece_7b, bisect_by=Plane(origin=(11.868794075130754, 40, 30.10362694300523), z_dir=(0, 0, 1)), keep=Keep.TOP, mode=Mode.PRIVATE)
    fillet_2_2_piece_7 = fillet_2_2_piece_7a & fillet_2_2_piece_7b
    add(fillet_2_2_piece_7, mode=Mode.SUBTRACT)

    # 草图7 → 凸台-拉伸4 (add)
    with BuildSketch(Plane.ZY.offset(-17.492227979274624)):
        Polygon((-7.896373056994782, 20), (-7.896373056994782, 2.500000000025966), (1.872876886886156, 2.5000000000259672), (1.8728768868861567, 20), align=None)
    extrude(amount=EXTRUDE_4_DEPTH)

    # 圆角3
    fillet_3_edges = [part.edges().sort_by_distance(p)[0] for p in [
        (17.492227979274624, 2.500000000025967, -3.011748085054313),
        (-5.507772020725, 20, -3.0117480850543075),
        (-5.507772020725383, 2.500000000025967, -3.011748085054313),
    ]]
    fillet(fillet_3_edges, radius=FILLET_3_R - 0.0001)  # a hair under: the kernel refuses the full size

    # 圆角4
    # the kernel refuses this fillet: 5 mm, written as the material it takes off along each edge
    with BuildSketch(Plane(origin=(37.49222797927462, 20.399417373710094, -20.396373056994783), x_dir=(-1, 0, 0), z_dir=(0, 0, 1))) as fillet_4_piece_1:
        with BuildLine():
            CenterArc((FILLET_4_R, FILLET_4_R), FILLET_4_R, 180, 90)
            Line((0, FILLET_4_R), (0, 0))
            Line((0, 0), (FILLET_4_R, 0))
        make_face()
    extrude(amount=50.500000000000014, mode=Mode.SUBTRACT)

    # 草图8 → 切除-拉伸5 (cut, through all)
    with BuildSketch(Plane(origin=(0, 20.399417373710094, 0), x_dir=(1, 0, 0), z_dir=(0, 1, 0))):
        with Locations(Location((27.492227980095734, -4.622370103598284, 0), (0, 0, 270))):
            Circle(SKETCH_8_R)
    extrude(amount=-CUT_EXTRUDE_5_DEPTH, mode=Mode.SUBTRACT)

    # 草图10 → 凸台-拉伸6 (add)
    with BuildSketch(Plane.XZ.offset(-2.5000000000259637)):
        with Locations(Location((27.492227980095738, 4.622370103598284, 0), (0, 0, 180))):
            Circle(SKETCH_10_R)
        with Locations(Location((27.492227980095738, 4.622370103598284, 0), (0, 0, 90))):
            Circle(SKETCH_10_R_2, mode=Mode.SUBTRACT)
    extrude(amount=EXTRUDE_6_DEPTH)

    # 草图11 → 凸台-拉伸7 (add)
    with BuildSketch(Plane.XY.offset(1.872876886886156)):
        Polygon((12.492227979274622, 2.5000000000259672), (22.492227979274624, 2.500000000025966), (17.49222797927462, 7.500000000025967), align=None)
    extrude(amount=-EXTRUDE_7_DEPTH)

    # 草图14 → 切除-拉伸7 (cut, through all)
    with BuildSketch(Plane(origin=(37.49222797927462, 0, -5.42e-15), x_dir=(-1.4e-16, 0, -1), z_dir=(1, 0, -1.4e-16))):
        with Locations(Location((-30.15759147547415, 11.50000000055565, 0), (0, 0, 270))):
            Circle(SKETCH_14_R)
    extrude(amount=-CUT_EXTRUDE_7_DEPTH, mode=Mode.SUBTRACT)

    # 草图17 → 凸台-拉伸8 (add)
    with BuildSketch(Plane(origin=(0, 0, -7.896373056994778), x_dir=(-1, 0, 0), z_dir=(0, 0, -1))):
        with BuildLine():
            Line((-11.868794075130754, 20.399417373710094), (-11.868794075130754, 2.500000000025967))
            Line((-11.868794075130754, 2.500000000025967), (-32.49222797927462, 2.5000000000259672))
            ThreePointArc((-32.49222797927462, 2.5000000000259672), (-36.027761885207354, 3.964466094093229), (-37.49222797927462, 7.500000000025965))
            Line((-37.49222797927462, 7.500000000025965), (-37.49222797927462, 15.399417373710092))
            ThreePointArc((-37.49222797927462, 15.399417373710092), (-36.027761885207354, 18.93495127964283), (-32.49222797927462, 20.399417373710094))
            Line((-32.49222797927462, 20.399417373710094), (-11.868794075130754, 20.399417373710094))
        make_face()
    extrude(amount=EXTRUDE_8_DEPTH)

    # 草图18 → 切除-拉伸10 (cut, through all)
    with BuildSketch(Plane.ZY.offset(-11.868794075130754)):
        with Locations((-14.842408524515182, 11.500000000561617)):
            Circle(SKETCH_18_R)
    extrude(amount=-CUT_EXTRUDE_10_DEPTH, mode=Mode.SUBTRACT)

    # 草图16 → 切除-拉伸8 (cut, through all)
    with BuildSketch(Plane(origin=(37.49222797927462, 0, -5.42e-15), x_dir=(-1.4e-16, 0, -1), z_dir=(1, 0, -1.4e-16))):
        with Locations(Location((14.84240852451923, 11.5000000000062, 0), (0, 0, 179.999999992))):
            Circle(SKETCH_16_R)
    extrude(amount=-CUT_EXTRUDE_8_DEPTH, mode=Mode.SUBTRACT)


solid = part.part
